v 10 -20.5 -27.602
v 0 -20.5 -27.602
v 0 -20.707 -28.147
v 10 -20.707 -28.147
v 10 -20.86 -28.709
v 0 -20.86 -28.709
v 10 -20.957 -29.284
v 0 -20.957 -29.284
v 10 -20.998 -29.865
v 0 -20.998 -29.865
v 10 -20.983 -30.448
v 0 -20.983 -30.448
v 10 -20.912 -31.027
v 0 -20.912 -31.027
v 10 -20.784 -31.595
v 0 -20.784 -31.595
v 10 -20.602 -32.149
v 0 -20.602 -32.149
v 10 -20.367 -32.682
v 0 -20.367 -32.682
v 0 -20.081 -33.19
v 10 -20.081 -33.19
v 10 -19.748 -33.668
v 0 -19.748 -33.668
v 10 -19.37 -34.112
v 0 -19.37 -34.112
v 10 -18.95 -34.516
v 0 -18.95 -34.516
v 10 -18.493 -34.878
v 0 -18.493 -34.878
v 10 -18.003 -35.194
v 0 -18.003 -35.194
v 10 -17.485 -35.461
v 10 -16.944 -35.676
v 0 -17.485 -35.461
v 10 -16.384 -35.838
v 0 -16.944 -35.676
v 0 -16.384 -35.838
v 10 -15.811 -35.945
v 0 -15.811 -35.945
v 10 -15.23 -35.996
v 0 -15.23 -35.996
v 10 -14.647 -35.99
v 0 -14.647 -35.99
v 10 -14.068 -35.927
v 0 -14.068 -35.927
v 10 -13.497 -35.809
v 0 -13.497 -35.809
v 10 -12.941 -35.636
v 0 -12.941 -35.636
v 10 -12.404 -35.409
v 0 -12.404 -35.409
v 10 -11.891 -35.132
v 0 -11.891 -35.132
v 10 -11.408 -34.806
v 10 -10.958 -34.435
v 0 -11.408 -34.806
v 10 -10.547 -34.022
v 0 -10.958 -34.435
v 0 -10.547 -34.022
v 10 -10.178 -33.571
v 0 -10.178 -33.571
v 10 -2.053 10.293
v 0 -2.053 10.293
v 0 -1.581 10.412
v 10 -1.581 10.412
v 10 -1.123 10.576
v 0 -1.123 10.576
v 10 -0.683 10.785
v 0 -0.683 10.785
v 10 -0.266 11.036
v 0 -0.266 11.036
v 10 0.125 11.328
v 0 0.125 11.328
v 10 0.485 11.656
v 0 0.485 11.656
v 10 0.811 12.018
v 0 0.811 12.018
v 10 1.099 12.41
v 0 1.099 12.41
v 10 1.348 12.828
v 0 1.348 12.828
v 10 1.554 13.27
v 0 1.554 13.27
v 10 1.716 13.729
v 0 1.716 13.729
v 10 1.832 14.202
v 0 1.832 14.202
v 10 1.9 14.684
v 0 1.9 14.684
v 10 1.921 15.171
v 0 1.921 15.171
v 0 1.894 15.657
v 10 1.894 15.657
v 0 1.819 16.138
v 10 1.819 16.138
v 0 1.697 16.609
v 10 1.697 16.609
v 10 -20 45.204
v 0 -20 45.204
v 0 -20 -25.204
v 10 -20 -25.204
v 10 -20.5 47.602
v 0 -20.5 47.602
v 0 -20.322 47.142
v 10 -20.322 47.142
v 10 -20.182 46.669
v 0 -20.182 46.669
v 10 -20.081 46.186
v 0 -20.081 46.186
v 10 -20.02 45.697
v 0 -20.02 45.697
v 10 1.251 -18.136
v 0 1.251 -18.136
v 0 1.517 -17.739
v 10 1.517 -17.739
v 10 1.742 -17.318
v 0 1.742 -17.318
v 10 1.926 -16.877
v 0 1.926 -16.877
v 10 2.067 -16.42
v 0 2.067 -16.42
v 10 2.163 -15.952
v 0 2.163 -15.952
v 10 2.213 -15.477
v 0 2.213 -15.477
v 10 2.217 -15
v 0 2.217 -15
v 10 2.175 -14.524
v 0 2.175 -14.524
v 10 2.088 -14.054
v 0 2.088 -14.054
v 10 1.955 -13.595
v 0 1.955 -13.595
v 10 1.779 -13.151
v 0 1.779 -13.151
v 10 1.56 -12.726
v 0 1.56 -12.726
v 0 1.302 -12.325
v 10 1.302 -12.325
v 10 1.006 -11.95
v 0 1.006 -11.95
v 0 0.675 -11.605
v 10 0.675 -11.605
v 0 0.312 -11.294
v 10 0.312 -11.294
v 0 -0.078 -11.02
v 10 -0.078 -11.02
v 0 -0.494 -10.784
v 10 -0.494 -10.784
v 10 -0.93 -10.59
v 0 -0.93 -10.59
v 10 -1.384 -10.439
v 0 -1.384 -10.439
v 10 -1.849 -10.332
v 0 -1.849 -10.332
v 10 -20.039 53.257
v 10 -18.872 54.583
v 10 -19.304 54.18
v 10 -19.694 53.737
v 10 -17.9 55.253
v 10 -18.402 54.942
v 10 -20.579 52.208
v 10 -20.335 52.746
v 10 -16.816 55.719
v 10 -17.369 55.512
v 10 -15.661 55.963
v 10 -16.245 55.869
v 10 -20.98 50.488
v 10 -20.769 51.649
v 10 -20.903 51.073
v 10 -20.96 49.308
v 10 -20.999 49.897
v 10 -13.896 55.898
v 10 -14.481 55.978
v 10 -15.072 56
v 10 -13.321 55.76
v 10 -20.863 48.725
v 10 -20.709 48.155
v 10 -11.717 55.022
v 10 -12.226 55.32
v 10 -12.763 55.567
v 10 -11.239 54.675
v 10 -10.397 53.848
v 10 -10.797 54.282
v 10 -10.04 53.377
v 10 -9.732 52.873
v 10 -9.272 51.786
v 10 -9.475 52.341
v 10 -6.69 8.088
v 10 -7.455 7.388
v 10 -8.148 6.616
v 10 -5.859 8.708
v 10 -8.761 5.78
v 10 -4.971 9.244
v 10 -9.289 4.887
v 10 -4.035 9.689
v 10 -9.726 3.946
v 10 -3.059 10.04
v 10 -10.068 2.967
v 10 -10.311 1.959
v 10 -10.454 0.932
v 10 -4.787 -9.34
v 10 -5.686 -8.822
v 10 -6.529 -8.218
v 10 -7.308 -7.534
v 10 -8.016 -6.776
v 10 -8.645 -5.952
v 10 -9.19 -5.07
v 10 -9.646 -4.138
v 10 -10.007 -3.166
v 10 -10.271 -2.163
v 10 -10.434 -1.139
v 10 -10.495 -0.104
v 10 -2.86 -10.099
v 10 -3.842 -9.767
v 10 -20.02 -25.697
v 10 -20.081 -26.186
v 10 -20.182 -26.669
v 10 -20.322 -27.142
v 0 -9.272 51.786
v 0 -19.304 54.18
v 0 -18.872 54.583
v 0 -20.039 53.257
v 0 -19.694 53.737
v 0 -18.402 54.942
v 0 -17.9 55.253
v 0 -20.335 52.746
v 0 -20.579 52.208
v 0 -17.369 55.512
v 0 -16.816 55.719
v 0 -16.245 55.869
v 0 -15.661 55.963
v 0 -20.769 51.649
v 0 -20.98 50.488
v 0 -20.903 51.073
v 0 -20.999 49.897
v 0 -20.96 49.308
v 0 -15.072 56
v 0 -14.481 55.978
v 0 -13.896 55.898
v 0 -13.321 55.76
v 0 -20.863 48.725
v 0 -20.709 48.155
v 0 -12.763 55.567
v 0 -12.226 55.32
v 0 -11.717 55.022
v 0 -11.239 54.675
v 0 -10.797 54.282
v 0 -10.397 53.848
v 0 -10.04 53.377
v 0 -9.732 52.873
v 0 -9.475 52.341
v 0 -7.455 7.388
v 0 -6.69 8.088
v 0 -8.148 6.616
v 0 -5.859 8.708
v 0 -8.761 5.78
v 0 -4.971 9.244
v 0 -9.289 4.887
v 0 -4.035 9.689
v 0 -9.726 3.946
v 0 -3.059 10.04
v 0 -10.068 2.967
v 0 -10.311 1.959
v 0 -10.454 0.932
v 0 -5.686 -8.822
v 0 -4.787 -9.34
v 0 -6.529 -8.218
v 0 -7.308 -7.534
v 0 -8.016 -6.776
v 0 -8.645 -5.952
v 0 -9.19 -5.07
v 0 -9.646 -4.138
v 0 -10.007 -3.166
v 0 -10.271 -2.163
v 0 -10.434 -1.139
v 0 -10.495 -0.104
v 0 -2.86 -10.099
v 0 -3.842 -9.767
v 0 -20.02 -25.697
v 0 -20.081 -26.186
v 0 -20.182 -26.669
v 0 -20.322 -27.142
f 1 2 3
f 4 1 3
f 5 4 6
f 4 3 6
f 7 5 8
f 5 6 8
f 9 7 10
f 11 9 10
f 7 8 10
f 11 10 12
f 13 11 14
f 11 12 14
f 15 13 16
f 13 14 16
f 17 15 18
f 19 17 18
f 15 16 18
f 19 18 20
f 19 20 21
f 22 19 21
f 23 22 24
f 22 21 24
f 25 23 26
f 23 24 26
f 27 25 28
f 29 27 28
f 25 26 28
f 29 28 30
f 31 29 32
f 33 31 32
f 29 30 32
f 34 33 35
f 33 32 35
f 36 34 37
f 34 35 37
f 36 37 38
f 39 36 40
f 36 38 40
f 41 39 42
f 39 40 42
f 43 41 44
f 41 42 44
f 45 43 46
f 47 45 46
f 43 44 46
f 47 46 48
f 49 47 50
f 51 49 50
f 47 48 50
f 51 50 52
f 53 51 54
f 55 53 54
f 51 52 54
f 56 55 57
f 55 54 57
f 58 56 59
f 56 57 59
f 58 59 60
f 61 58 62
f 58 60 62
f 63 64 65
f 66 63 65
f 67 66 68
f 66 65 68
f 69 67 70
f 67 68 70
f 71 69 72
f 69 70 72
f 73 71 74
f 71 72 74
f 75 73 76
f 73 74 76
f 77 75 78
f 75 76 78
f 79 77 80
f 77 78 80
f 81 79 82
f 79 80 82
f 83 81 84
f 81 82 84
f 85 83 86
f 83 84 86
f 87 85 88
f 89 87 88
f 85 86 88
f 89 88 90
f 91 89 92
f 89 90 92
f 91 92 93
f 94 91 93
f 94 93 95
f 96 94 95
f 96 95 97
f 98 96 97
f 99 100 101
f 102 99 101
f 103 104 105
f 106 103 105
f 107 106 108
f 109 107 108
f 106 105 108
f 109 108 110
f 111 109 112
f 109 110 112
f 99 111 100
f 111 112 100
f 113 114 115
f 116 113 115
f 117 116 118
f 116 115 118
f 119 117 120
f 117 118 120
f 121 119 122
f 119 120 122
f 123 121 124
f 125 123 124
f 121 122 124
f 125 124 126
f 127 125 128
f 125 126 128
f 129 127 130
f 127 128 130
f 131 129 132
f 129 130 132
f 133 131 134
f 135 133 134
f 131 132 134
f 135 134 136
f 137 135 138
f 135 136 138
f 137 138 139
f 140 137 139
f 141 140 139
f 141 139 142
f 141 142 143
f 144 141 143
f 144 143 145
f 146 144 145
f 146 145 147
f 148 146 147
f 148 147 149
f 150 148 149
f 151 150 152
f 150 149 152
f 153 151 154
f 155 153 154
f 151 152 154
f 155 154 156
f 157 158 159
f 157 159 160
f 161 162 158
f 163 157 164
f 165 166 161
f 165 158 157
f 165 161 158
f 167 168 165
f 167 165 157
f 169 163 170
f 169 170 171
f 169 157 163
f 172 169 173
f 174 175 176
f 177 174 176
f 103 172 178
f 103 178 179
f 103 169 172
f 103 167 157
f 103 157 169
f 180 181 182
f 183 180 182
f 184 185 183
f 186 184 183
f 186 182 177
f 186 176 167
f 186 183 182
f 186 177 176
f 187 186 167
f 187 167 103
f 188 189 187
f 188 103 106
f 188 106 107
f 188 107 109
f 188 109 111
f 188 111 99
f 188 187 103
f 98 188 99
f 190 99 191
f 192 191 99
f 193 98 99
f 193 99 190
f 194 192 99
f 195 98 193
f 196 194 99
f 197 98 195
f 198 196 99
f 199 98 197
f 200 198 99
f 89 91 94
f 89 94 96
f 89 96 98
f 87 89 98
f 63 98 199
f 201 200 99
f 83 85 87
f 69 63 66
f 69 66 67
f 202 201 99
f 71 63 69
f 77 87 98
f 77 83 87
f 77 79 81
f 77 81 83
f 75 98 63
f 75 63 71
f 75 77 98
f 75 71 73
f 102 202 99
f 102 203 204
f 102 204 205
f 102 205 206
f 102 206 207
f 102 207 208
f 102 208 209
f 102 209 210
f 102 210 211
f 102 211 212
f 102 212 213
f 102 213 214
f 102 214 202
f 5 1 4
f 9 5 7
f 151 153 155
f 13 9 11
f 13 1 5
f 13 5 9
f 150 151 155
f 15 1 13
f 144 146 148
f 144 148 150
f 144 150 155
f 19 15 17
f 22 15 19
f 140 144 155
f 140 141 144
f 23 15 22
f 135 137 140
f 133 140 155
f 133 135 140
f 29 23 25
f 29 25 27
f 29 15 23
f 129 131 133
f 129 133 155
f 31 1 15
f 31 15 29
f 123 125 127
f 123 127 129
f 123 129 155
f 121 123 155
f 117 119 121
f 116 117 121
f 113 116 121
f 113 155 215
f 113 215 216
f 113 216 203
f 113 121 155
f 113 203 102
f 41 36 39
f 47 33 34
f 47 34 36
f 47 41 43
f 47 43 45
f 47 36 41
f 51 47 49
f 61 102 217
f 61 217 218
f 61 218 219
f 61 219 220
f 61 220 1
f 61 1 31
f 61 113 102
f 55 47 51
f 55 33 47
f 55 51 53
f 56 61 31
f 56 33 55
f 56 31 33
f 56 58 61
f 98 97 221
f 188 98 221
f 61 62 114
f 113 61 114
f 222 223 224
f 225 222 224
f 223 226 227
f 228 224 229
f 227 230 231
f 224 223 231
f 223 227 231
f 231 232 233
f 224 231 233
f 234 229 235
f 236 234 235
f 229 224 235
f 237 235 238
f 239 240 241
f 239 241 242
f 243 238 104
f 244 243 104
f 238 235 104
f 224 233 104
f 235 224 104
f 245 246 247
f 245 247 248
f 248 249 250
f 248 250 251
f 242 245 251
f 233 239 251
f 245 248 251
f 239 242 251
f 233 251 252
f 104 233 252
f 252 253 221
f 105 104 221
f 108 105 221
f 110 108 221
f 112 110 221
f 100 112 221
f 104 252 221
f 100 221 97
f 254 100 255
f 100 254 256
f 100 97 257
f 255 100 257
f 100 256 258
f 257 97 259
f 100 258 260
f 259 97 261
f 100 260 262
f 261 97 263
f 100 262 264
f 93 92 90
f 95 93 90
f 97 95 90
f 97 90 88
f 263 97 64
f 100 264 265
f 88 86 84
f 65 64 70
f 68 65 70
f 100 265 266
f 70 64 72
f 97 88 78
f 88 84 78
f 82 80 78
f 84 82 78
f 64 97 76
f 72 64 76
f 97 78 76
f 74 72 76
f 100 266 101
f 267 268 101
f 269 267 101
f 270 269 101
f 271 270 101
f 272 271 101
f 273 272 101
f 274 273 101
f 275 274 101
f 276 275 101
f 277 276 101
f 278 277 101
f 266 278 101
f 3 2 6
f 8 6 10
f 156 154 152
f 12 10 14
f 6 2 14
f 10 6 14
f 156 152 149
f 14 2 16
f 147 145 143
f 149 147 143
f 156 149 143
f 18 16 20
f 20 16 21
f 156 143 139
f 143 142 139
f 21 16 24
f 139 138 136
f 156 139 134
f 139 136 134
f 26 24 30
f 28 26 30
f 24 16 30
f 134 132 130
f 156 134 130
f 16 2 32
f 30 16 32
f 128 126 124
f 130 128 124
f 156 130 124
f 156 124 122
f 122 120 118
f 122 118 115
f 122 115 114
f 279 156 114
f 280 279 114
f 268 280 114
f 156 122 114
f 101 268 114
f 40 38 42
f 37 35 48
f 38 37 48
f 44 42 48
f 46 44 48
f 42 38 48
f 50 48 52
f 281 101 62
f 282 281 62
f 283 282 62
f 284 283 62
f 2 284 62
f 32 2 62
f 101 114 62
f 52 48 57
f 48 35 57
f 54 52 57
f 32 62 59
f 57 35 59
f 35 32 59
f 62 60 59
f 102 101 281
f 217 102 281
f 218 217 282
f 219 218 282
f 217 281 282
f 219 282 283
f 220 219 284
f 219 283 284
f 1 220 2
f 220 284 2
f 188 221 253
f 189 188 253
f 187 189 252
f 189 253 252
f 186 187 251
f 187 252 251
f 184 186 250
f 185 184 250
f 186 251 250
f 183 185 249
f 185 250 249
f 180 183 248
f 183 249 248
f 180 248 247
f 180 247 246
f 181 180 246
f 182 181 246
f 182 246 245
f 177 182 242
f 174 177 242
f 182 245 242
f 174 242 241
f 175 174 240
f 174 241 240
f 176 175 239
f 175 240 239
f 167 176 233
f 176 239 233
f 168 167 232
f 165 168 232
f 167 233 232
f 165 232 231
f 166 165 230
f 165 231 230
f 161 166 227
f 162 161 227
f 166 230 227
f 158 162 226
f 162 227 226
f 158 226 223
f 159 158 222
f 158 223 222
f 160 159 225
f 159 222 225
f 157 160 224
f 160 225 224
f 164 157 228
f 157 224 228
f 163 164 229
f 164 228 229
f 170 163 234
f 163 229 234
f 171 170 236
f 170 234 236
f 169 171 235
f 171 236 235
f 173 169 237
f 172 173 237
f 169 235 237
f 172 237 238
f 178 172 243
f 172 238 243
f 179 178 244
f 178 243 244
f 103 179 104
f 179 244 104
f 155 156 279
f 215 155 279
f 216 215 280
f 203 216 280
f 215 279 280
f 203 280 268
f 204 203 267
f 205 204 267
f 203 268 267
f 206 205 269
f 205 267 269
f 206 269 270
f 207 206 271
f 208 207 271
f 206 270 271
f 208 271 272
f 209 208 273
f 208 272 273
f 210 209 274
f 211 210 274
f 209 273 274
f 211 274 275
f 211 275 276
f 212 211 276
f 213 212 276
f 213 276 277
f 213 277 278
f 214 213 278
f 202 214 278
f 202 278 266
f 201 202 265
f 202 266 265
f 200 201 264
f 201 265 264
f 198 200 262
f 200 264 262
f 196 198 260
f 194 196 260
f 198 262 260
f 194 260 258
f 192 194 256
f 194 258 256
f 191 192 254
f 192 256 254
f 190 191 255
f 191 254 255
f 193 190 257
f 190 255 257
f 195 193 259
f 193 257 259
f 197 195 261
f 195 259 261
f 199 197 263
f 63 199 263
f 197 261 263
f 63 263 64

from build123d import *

# Parameters (mm, degrees)
BOSS_EXTRUDE1_DEPTH = 10


with BuildPart() as part:
    # Sketch1 → Boss-Extrude1 (new body)
    with BuildSketch(Plane(origin=(0, 0, 0), x_dir=(0, 0, -1), z_dir=(1, 0, 0))):
        with BuildLine():
            Line((-45.204168477, -20), (25.204168477, -20))
            ThreePointArc((25.204168477, -20), (26.428913348, -20.126329938), (27.602084238, -20.5))
            ThreePointArc((27.602084238, -20.5), (35.194165826, -18.003438259), (33.570567469, -10.178065953))
            Line((33.570567469, -10.178065953), (18.135704254, 1.251211168))
            ThreePointArc((18.135704254, 1.251211168), (13.371146439, 1.87224401), (10.33172294, -1.849126403))
            ThreePointArc((10.33172294, -1.849126403), (0.10386055, -10.495379), (-10.293105897, -2.053226328))
            ThreePointArc((-10.293105897, -2.053226328), (-12.616026385, 1.228698191), (-16.609464476, 1.697142804))
            Line((-16.609464476, 1.697142804), (-51.78615696, -9.272029739))
            ThreePointArc((-51.78615696, -9.272029739), (-55.622311914, -17.095139314), (-47.602084238, -20.5))
            ThreePointArc((-47.602084238, -20.5), (-46.428913348, -20.126329938), (-45.204168477, -20))
        make_face()
    extrude(amount=BOSS_EXTRUDE1_DEPTH)


solid = part.part
